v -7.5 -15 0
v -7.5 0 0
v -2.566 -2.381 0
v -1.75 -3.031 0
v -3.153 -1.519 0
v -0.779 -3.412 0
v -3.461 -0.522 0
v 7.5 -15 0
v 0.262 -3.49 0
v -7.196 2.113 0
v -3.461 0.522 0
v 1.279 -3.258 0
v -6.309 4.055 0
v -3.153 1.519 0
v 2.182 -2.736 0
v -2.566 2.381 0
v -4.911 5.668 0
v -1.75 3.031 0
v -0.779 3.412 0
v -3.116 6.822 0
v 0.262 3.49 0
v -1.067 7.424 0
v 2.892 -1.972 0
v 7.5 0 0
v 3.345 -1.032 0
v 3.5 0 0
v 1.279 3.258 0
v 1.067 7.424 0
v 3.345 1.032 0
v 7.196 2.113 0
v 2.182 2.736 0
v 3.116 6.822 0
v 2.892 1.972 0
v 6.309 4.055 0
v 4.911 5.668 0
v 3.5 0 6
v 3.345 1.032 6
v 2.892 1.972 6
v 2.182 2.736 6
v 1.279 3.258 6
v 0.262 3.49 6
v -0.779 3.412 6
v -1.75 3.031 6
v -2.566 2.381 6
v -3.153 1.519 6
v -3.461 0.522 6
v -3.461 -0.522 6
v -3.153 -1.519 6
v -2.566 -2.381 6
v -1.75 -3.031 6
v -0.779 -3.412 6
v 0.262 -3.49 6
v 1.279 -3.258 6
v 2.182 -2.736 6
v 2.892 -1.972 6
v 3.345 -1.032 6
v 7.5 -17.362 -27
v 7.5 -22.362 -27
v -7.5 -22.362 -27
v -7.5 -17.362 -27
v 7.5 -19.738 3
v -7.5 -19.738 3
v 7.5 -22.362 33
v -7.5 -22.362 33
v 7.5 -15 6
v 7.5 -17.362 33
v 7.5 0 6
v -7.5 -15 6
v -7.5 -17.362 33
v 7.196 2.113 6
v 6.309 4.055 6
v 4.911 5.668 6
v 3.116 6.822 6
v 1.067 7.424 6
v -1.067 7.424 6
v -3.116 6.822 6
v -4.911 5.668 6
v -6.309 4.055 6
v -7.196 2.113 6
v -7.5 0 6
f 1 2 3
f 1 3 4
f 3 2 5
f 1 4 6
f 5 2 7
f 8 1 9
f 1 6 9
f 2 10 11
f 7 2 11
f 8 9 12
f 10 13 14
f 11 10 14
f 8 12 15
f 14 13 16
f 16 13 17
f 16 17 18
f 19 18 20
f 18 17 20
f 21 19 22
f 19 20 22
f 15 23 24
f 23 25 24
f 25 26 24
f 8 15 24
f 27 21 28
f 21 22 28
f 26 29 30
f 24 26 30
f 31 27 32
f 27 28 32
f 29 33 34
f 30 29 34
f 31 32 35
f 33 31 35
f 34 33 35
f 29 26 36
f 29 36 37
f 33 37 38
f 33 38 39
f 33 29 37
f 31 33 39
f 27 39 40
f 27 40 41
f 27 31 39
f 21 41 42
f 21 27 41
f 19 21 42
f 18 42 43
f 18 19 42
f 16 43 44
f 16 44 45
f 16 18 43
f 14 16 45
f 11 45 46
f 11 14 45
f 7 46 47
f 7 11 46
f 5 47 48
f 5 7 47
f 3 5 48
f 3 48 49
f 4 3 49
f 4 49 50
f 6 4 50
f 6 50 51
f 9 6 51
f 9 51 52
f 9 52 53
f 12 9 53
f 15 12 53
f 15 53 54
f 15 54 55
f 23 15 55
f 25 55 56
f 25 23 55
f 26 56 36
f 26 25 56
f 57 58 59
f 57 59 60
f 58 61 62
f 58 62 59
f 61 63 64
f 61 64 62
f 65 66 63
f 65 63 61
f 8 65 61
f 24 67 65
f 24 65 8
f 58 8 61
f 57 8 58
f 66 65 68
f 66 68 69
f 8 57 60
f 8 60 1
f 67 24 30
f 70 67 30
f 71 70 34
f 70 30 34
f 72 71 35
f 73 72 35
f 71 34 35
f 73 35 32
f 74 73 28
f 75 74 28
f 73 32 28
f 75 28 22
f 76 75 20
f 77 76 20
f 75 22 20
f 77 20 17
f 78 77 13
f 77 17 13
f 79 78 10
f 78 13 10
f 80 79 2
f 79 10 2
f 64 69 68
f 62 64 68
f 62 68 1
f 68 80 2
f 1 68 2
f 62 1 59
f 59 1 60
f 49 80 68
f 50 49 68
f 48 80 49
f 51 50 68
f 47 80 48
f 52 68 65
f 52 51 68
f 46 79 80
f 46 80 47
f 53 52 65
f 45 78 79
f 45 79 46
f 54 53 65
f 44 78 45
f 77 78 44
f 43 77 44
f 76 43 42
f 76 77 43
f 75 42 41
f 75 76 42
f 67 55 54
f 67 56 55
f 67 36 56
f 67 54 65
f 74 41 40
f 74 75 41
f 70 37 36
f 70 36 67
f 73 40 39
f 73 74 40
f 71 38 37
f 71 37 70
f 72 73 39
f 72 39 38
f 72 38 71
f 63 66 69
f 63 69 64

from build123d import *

# Parameters (mm, degrees)
SKETCH1_R           = 3.5
BOSS_EXTRUDE1_DEPTH = 6
BOSS_EXTRUDE2_DEPTH = 15


with BuildPart() as part:
    # Sketch1 → Boss-Extrude1 (new body)
    with BuildSketch(Plane.XY):
        with BuildLine():
            Line((-7.5, 0), (-7.5, -15))
            Line((-7.5, -15), (7.5, -15))
            Line((7.5, -15), (7.5, 0))
            ThreePointArc((7.5, 0), (0, 7.5), (-7.5, 0))
        make_face()
        Circle(SKETCH1_R, mode=Mode.SUBTRACT)
    extrude(amount=BOSS_EXTRUDE1_DEPTH)

    # Sketch2 → Boss-Extrude2 (add)
    with BuildSketch(Plane(origin=(7.5, 0, 0), x_dir=(0, 0, -1), z_dir=(1, 0, 0))):
        Polygon((-6, -15), (-33, -17.362193915), (-33, -22.362193915), (-3, -19.737534009), (27, -22.362193915), (27, -17.362193915), (0, -15), align=None)
    extrude(amount=-BOSS_EXTRUDE2_DEPTH)


solid = part.part
